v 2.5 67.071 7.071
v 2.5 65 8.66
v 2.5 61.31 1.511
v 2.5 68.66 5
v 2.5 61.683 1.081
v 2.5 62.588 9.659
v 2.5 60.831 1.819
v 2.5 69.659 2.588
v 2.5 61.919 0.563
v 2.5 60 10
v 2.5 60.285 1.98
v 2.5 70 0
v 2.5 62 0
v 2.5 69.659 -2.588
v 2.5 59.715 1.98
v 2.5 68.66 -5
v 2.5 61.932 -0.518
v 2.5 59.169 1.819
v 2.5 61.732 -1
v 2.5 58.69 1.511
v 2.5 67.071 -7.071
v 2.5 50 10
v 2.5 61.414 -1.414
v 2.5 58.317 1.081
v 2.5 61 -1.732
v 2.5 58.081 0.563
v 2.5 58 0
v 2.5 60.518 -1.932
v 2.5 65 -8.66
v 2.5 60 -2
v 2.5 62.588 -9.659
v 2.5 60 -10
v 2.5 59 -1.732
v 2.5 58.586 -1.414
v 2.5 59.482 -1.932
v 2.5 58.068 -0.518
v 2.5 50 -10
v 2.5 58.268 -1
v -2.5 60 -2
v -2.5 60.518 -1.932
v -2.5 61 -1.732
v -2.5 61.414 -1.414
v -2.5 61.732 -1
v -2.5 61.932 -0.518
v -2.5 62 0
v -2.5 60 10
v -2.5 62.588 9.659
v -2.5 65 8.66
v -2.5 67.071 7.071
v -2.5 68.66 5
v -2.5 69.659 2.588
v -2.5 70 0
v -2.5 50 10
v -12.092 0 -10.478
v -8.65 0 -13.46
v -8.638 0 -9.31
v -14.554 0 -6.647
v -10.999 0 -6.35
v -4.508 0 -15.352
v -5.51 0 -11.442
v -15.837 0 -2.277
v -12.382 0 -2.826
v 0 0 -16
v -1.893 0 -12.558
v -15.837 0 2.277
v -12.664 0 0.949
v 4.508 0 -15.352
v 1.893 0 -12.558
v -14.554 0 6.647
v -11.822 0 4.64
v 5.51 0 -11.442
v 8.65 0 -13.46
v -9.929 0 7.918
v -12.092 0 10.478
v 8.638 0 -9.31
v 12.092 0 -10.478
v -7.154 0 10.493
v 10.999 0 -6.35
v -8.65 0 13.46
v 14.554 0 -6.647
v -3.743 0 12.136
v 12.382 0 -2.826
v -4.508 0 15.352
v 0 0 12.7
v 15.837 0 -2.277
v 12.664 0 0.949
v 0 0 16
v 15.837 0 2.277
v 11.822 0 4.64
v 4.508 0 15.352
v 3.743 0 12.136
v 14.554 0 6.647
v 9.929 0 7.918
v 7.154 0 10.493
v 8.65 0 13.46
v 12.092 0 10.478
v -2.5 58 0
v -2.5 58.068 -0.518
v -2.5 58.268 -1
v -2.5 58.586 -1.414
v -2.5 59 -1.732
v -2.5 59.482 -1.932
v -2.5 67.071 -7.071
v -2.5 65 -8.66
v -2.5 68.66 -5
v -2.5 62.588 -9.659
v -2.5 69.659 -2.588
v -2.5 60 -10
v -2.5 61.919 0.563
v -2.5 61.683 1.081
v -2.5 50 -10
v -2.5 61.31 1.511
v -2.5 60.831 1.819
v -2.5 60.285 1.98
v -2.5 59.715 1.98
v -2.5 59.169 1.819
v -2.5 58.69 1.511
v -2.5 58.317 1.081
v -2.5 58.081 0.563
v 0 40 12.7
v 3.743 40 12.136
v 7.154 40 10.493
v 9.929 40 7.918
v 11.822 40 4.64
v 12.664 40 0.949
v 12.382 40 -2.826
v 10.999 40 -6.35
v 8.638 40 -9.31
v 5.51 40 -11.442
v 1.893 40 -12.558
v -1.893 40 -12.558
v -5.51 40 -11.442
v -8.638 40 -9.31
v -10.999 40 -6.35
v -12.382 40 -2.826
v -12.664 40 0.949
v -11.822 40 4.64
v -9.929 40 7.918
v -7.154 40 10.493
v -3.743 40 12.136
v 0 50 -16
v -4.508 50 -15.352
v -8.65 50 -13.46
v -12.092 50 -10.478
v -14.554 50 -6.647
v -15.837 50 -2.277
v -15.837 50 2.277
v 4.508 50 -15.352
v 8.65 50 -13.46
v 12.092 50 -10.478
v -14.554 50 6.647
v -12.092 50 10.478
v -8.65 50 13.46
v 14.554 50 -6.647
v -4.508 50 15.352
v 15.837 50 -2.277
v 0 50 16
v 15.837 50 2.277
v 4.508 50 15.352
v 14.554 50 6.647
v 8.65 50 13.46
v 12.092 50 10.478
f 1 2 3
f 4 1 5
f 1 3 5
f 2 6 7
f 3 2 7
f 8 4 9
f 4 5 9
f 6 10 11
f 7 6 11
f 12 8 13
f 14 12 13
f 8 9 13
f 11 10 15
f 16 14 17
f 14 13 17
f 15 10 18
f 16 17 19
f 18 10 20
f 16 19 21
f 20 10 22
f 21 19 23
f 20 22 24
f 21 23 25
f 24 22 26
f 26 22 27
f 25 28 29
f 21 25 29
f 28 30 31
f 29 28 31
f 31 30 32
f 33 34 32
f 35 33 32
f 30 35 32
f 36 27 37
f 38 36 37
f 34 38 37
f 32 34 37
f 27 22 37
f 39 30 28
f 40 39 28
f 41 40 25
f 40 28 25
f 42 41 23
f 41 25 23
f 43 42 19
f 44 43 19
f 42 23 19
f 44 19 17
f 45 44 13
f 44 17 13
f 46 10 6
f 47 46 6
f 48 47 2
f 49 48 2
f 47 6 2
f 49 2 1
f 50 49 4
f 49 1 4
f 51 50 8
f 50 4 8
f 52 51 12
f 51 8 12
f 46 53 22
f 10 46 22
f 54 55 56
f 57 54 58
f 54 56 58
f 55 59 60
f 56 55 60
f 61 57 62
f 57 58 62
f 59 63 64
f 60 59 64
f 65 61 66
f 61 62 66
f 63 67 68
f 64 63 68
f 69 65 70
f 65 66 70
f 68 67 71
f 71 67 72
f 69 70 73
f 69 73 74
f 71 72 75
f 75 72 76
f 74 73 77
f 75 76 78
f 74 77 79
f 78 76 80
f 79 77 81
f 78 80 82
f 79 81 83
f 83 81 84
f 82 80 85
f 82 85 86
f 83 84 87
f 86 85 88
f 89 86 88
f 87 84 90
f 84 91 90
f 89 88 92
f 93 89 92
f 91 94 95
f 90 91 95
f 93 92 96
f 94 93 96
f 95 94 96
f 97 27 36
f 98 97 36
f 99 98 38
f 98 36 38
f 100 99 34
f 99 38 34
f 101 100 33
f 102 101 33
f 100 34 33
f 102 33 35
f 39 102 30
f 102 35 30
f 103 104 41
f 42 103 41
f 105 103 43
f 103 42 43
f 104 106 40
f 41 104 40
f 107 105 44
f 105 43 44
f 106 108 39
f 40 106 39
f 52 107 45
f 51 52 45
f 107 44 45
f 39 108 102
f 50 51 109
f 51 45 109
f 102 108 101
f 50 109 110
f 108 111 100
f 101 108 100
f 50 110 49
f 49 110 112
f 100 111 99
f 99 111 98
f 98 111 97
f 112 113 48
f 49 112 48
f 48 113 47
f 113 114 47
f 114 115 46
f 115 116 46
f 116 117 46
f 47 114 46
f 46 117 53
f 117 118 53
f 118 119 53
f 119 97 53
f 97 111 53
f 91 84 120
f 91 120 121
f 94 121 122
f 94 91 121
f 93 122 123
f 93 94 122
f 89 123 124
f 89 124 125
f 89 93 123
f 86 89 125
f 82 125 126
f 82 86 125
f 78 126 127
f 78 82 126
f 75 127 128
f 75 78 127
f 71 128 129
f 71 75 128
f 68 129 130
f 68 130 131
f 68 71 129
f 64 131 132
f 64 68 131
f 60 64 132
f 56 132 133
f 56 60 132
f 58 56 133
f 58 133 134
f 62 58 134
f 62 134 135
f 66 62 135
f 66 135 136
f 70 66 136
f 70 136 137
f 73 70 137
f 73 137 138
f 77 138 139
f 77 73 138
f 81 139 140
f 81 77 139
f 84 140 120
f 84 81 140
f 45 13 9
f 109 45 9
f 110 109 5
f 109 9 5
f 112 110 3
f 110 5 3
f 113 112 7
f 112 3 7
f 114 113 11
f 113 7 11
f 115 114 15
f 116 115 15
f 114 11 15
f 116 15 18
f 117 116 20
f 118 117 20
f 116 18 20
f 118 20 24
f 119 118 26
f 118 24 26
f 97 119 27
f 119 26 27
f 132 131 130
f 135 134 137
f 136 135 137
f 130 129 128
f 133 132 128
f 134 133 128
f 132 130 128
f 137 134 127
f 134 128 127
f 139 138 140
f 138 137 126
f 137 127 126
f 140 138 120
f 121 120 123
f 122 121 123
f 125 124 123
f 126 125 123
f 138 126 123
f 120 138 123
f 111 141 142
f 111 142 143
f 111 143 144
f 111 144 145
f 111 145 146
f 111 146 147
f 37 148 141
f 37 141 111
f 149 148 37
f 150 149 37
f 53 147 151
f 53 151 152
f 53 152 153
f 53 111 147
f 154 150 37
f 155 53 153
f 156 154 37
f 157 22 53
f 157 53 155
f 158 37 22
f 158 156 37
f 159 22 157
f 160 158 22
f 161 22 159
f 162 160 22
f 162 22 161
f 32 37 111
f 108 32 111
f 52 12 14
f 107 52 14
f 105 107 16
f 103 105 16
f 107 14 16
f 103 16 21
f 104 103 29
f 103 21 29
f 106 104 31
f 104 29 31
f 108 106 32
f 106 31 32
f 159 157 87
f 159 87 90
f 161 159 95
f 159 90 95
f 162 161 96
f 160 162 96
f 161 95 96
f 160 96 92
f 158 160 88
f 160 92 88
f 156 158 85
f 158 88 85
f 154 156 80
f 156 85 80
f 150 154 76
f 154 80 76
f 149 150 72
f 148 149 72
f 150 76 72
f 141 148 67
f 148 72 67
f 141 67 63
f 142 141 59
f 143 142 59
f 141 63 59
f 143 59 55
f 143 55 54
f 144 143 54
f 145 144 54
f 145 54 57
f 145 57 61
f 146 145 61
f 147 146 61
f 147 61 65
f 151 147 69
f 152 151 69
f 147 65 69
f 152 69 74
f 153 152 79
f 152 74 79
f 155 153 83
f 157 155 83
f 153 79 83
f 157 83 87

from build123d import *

# Parameters (mm, degrees)
SKETCH1_R           = 16
SKETCH1_R_2         = 12.7
BOSS_EXTRUDE1_DEPTH = 40
SKETCH2_R           = 16
BOSS_EXTRUDE2_DEPTH = 10
BOSS_EXTRUDE3_DEPTH = 20
CUT_EXTRUDE1_DEPTH  = 5


with BuildPart() as part:
    # Sketch1 → Boss-Extrude1 (new body)
    with BuildSketch(Plane(origin=(0, 0, 0), x_dir=(1, 0, 0), z_dir=(0, 1, 0))):
        with Locations(Location((0, 0, 0), (0, 0, 270))):
            Circle(SKETCH1_R)
        with Locations(Location((0, 0, 0), (0, 0, 270))):
            Circle(SKETCH1_R_2, mode=Mode.SUBTRACT)
    extrude(amount=BOSS_EXTRUDE1_DEPTH)

    # Sketch2 → Boss-Extrude2 (add)
    with BuildSketch(Plane(origin=(0, 40, 0), x_dir=(1, 0, 0), z_dir=(0, 1, 0))):
        with Locations(Location((0, 0, 0), (0, 0, 270))):
            Circle(SKETCH2_R)
    extrude(amount=BOSS_EXTRUDE2_DEPTH)

    # Sketch3 → Boss-Extrude3 (add)
    with BuildSketch(Plane(origin=(0, 50, 0), x_dir=(1, 0, 0), z_dir=(0, 1, 0))):
        Polygon((0, -10), (0, 0), (0, 10), (-2.5, 10), (-2.5, -10), align=None)
        Polygon((0, 10), (0, 0), (0, -10), (2.5, -10), (2.5, 10), align=None)
    extrude(amount=BOSS_EXTRUDE3_DEPTH)

    # Sketch4 → Cut-Extrude1 (cut)
    with BuildSketch(Plane(origin=(2.5, 0, 0), x_dir=(0, 0, -1), z_dir=(1, 0, 0))):
        with BuildLine():
            Line((0, 70), (-10, 70))
            Line((-10, 70), (-10, 60))
            ThreePointArc((-10, 60), (-7.071067812, 67.071067812), (0, 70))
        make_face()
        with BuildLine():
            Line((10, 70), (0, 70))
            ThreePointArc((0, 70), (7.071067812, 67.071067812), (10, 60))
            Line((10, 60), (10, 70))
        make_face()
        with BuildLine():
            ThreePointArc((2, 60), (1.414213562, 61.414213562), (0, 62))
            Line((0, 62), (0, 58))
            ThreePointArc((0, 58), (1.414213562, 58.585786438), (2, 60))
        make_face()
        with BuildLine():
            Line((0, 58), (0, 62))
            ThreePointArc((0, 62), (-2, 60), (0, 58))
        make_face()
    extrude(amount=-CUT_EXTRUDE1_DEPTH, mode=Mode.SUBTRACT)


solid = part.part
